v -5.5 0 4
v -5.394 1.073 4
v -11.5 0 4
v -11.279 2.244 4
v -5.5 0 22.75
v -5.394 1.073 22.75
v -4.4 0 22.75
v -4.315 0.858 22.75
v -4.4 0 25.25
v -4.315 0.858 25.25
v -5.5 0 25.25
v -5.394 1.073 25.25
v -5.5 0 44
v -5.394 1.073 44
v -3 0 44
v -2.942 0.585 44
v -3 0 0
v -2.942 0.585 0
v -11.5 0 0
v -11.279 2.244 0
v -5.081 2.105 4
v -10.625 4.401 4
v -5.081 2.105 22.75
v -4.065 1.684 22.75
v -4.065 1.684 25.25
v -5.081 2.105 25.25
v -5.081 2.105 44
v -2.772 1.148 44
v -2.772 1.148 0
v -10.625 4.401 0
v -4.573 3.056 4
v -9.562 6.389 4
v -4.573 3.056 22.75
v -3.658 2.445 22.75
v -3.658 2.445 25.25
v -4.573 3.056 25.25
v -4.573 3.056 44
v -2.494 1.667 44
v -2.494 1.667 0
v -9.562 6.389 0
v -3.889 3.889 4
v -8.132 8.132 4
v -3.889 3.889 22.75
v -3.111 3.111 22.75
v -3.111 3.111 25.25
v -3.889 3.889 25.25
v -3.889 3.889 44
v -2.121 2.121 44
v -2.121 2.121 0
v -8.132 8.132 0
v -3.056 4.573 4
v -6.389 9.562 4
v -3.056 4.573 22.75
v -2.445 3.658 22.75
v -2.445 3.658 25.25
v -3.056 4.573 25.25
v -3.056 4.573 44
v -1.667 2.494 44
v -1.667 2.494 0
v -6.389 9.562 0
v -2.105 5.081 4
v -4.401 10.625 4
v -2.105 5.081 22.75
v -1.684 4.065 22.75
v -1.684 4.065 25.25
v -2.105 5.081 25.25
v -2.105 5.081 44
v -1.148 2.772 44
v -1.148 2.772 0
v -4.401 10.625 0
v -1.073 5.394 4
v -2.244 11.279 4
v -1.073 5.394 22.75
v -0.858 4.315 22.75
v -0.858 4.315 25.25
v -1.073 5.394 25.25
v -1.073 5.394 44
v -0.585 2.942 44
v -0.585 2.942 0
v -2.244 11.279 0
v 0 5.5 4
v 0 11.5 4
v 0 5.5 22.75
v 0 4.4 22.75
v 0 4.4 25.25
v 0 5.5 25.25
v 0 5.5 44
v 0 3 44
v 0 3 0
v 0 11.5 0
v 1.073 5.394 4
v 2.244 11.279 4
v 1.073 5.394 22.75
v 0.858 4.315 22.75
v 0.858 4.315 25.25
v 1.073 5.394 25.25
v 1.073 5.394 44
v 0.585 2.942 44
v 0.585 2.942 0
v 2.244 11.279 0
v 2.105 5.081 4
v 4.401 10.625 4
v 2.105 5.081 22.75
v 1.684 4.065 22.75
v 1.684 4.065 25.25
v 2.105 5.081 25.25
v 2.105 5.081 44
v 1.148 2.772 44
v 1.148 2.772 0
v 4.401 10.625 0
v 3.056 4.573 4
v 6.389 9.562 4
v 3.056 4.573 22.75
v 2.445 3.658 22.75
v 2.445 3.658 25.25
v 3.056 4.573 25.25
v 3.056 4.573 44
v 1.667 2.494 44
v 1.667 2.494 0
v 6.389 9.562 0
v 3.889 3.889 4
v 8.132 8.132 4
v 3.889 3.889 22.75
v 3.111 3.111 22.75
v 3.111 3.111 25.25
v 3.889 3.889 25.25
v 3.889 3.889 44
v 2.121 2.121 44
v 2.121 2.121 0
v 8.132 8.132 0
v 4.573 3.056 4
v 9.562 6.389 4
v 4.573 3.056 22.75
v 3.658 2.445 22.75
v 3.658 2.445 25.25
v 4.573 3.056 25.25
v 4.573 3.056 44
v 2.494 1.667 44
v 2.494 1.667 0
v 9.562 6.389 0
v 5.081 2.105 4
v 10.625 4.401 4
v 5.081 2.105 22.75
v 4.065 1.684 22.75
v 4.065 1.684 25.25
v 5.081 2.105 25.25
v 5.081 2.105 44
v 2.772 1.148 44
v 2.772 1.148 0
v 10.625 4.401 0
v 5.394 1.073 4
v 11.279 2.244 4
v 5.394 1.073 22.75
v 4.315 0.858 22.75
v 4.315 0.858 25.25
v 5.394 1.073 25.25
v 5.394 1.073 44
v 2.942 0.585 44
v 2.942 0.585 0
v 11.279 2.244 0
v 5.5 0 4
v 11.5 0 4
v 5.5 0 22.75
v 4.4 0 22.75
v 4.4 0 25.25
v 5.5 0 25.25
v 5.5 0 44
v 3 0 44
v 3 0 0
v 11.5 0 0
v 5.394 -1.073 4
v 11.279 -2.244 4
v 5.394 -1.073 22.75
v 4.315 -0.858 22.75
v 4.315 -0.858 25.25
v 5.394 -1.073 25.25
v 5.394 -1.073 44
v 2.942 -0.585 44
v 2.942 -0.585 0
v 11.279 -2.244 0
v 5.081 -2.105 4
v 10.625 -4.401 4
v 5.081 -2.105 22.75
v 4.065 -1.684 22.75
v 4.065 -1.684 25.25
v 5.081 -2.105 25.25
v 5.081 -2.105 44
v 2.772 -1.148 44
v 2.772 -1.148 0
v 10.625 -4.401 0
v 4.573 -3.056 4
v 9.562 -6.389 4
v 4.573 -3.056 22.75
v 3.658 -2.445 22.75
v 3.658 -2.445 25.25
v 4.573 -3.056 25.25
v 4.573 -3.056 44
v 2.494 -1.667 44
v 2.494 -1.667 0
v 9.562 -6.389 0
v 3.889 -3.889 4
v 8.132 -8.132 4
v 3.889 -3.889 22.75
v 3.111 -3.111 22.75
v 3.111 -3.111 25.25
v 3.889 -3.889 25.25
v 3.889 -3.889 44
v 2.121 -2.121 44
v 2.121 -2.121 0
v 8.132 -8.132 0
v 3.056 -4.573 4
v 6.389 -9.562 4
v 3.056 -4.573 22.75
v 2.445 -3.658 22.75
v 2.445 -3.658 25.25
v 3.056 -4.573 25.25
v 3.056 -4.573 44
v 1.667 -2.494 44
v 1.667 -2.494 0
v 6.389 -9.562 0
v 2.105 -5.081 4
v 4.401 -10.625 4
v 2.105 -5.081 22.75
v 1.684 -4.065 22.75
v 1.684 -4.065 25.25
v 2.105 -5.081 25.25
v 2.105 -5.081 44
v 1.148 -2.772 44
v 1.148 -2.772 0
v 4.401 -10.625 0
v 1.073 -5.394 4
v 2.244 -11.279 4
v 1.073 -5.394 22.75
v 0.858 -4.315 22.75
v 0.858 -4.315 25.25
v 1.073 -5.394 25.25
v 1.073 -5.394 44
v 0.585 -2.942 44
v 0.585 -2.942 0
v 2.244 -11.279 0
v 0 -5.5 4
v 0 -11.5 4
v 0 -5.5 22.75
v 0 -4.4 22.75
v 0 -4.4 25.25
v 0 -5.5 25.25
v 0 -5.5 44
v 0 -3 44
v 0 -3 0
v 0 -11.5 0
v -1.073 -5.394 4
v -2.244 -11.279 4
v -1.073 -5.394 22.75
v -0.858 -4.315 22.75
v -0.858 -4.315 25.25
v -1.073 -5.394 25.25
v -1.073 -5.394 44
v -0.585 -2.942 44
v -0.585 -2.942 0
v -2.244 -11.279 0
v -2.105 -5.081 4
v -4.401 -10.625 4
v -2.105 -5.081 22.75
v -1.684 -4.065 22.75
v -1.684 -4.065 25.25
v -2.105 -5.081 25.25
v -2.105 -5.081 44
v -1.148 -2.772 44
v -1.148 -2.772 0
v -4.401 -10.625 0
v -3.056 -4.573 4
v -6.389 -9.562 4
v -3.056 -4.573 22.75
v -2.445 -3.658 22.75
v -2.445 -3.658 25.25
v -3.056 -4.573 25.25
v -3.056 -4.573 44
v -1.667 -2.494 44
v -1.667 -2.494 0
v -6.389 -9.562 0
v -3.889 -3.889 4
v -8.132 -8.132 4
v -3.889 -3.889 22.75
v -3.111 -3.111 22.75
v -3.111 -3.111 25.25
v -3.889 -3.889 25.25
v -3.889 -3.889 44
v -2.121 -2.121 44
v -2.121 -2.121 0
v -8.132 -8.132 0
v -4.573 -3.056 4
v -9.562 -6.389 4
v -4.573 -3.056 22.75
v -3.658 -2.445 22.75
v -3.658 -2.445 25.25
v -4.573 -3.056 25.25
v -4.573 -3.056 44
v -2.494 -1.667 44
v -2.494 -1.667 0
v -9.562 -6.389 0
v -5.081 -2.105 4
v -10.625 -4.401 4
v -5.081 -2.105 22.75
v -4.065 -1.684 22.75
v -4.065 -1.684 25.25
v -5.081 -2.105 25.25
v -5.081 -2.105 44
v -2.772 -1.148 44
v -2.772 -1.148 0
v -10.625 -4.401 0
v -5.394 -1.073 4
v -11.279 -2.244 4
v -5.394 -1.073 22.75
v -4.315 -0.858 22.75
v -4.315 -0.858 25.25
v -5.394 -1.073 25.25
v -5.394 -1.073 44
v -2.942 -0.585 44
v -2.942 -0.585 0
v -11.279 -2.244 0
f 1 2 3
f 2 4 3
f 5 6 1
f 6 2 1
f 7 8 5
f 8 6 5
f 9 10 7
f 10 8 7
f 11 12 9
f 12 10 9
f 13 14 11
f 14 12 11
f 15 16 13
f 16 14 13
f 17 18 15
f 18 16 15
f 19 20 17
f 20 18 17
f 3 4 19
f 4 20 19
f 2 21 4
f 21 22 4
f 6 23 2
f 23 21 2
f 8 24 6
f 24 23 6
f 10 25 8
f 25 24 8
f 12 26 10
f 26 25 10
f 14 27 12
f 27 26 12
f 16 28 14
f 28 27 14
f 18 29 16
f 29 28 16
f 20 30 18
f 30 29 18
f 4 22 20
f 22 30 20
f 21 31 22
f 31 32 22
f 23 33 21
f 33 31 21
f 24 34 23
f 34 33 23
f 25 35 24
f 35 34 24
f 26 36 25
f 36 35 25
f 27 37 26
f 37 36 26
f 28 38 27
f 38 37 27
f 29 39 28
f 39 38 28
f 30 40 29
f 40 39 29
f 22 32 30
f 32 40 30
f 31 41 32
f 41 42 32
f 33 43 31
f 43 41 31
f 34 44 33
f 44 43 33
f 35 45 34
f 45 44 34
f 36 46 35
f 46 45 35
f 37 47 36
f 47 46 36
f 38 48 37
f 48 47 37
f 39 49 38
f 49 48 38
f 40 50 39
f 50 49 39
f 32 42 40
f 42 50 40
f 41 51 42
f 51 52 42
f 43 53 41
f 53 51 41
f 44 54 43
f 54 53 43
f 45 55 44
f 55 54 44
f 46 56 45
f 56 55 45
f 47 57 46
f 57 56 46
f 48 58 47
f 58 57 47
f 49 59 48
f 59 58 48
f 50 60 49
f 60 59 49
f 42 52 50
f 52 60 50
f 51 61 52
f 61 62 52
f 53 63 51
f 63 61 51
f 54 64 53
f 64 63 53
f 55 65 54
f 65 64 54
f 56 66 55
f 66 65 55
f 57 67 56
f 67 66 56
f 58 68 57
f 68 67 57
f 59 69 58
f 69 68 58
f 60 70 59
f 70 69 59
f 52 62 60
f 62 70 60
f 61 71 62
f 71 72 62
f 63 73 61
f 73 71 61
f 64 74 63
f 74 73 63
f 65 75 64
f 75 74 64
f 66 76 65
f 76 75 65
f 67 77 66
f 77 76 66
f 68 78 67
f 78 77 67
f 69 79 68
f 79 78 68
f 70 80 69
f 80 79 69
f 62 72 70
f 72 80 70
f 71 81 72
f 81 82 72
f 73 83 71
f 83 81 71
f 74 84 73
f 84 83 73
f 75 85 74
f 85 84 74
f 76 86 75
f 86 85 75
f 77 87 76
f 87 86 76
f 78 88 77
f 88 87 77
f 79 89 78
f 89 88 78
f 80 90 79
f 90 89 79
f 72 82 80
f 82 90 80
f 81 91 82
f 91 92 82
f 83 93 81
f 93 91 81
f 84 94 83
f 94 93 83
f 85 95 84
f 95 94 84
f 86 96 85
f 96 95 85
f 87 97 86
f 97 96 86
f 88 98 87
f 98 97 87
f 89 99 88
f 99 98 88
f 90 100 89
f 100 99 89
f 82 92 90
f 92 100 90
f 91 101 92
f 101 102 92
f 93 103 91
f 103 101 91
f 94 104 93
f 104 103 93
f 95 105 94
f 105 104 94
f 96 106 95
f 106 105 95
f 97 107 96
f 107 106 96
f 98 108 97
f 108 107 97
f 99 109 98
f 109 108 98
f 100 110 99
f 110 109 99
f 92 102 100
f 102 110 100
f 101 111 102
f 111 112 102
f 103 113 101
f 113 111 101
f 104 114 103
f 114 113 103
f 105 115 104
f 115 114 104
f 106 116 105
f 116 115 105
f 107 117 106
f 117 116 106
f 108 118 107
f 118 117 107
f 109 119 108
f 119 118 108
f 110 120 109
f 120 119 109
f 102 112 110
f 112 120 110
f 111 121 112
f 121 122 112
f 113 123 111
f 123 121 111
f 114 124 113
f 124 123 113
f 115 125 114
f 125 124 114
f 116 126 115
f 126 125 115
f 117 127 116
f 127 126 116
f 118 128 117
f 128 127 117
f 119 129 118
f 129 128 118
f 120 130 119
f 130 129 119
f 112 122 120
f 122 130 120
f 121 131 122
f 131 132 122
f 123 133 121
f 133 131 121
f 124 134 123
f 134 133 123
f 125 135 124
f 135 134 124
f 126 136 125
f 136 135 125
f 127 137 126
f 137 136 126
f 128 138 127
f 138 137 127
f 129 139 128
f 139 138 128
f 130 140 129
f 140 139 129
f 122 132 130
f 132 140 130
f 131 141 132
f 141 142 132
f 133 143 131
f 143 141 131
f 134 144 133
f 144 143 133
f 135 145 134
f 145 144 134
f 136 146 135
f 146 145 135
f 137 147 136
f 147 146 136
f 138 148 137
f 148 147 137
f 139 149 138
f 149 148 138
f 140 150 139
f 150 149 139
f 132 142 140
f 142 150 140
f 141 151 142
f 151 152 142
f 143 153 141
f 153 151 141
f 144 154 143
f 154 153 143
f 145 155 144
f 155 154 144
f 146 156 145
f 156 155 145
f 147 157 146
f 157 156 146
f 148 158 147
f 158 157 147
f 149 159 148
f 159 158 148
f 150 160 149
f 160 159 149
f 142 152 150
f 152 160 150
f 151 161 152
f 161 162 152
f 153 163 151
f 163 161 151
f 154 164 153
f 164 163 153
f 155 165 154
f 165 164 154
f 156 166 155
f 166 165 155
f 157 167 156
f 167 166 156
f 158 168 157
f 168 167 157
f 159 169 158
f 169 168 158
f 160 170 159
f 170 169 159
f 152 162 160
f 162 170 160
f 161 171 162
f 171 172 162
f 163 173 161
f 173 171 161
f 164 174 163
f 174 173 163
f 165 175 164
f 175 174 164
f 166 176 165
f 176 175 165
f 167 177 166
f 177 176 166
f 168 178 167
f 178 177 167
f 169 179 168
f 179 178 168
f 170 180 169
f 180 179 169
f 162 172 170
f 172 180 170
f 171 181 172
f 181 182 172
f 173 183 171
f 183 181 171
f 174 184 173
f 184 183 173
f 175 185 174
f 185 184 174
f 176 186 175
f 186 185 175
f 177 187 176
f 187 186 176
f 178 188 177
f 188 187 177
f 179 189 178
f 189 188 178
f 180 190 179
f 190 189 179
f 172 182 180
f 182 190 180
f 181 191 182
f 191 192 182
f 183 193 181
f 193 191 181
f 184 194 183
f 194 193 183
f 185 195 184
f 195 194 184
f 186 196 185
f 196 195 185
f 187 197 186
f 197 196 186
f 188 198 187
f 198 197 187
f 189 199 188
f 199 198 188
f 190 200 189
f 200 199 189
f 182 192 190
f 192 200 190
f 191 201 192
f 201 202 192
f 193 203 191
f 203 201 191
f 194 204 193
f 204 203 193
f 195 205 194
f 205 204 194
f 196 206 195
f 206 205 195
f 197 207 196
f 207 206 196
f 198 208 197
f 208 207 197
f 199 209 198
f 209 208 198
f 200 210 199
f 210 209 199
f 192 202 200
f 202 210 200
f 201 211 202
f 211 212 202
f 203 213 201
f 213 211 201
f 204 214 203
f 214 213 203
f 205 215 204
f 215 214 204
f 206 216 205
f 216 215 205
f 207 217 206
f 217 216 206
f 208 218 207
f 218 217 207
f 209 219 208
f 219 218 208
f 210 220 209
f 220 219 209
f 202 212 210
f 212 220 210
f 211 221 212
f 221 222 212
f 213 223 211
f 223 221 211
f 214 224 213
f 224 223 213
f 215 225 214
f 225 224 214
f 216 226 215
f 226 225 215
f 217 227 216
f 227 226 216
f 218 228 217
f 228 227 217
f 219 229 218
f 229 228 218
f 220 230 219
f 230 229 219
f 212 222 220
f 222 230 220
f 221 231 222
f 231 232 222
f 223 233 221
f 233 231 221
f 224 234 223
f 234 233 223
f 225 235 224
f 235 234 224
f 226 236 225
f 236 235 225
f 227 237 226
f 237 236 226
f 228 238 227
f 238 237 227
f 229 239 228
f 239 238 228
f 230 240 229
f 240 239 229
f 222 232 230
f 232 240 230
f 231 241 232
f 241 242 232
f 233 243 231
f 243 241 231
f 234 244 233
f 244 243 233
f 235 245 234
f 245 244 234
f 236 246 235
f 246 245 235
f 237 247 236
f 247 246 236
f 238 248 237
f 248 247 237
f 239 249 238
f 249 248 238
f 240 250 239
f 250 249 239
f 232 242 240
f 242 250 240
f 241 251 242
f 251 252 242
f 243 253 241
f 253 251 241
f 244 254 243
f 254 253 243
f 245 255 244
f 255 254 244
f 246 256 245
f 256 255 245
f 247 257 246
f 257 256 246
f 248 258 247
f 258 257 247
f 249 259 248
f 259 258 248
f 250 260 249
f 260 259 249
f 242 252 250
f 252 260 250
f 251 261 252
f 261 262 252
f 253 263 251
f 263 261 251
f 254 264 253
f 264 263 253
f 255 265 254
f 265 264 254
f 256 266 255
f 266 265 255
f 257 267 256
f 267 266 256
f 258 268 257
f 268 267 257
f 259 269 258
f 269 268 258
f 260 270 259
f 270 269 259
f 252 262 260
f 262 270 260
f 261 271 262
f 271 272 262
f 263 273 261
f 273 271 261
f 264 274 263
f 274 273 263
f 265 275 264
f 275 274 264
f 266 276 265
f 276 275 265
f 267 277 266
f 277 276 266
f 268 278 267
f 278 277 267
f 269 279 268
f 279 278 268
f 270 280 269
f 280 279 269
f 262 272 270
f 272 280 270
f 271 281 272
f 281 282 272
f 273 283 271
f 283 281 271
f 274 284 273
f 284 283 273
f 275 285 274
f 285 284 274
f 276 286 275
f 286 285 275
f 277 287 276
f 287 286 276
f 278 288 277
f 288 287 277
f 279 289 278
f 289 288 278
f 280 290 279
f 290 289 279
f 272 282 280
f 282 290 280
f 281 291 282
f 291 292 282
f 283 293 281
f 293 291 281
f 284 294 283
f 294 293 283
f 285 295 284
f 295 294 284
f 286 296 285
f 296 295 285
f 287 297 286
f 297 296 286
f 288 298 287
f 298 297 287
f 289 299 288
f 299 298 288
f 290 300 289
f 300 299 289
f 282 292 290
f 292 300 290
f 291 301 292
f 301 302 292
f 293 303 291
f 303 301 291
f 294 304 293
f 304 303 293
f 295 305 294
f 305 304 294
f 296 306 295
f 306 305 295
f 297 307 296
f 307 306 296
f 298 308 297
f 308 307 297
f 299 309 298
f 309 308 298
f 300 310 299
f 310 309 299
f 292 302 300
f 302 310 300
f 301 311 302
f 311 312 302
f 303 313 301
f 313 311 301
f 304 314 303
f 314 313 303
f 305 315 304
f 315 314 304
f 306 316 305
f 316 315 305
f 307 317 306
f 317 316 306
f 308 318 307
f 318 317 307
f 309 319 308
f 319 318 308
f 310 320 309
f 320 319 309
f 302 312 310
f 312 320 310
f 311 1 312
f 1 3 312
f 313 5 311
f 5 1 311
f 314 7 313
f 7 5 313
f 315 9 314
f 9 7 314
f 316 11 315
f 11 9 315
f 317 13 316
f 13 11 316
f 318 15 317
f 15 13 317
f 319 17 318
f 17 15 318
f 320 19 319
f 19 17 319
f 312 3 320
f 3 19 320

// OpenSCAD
$fn = 32;

// ----------------------------------------------------------------------
// Grooved revolve: flanged, bore R3
// ----------------------------------------------------------------------

// --- parameters (mm) ---
bore_r = 3;               // bore radius
outer_r = 5.5;            // outer radius of the body
total_h = 44;             // overall height, Z
wall = 2.5;               // radial wall thickness
groove_w = 2.5;           // groove width
groove_d = 1.1;           // groove depth
grooves = 1;              // number of outer grooves
flange_r = 11.5;          // flange radius
flange_h = 4;             // flange height

bbox_x = 2 * flange_r;  // full diameter
bore_d = 2 * bore_r;  // bore diameter
body_d = 2 * outer_r;  // body diameter
flange_d = 2 * flange_r;  // flange diameter
revolve_angle = 360;  // full turn around the Z axis

profile = [[3, 0], [5.5, 0], [11.5, 0], [11.5, 4], [5.5, 4], [5.5, 22.75], [4.4, 22.75], [4.4, 25.25], [5.5, 25.25], [5.5, 44], [3, 44]];  // primary outline, 11 points, counter clockwise

// --- the one profile operation ---
rotate_extrude(angle = revolve_angle) polygon(points = profile);
